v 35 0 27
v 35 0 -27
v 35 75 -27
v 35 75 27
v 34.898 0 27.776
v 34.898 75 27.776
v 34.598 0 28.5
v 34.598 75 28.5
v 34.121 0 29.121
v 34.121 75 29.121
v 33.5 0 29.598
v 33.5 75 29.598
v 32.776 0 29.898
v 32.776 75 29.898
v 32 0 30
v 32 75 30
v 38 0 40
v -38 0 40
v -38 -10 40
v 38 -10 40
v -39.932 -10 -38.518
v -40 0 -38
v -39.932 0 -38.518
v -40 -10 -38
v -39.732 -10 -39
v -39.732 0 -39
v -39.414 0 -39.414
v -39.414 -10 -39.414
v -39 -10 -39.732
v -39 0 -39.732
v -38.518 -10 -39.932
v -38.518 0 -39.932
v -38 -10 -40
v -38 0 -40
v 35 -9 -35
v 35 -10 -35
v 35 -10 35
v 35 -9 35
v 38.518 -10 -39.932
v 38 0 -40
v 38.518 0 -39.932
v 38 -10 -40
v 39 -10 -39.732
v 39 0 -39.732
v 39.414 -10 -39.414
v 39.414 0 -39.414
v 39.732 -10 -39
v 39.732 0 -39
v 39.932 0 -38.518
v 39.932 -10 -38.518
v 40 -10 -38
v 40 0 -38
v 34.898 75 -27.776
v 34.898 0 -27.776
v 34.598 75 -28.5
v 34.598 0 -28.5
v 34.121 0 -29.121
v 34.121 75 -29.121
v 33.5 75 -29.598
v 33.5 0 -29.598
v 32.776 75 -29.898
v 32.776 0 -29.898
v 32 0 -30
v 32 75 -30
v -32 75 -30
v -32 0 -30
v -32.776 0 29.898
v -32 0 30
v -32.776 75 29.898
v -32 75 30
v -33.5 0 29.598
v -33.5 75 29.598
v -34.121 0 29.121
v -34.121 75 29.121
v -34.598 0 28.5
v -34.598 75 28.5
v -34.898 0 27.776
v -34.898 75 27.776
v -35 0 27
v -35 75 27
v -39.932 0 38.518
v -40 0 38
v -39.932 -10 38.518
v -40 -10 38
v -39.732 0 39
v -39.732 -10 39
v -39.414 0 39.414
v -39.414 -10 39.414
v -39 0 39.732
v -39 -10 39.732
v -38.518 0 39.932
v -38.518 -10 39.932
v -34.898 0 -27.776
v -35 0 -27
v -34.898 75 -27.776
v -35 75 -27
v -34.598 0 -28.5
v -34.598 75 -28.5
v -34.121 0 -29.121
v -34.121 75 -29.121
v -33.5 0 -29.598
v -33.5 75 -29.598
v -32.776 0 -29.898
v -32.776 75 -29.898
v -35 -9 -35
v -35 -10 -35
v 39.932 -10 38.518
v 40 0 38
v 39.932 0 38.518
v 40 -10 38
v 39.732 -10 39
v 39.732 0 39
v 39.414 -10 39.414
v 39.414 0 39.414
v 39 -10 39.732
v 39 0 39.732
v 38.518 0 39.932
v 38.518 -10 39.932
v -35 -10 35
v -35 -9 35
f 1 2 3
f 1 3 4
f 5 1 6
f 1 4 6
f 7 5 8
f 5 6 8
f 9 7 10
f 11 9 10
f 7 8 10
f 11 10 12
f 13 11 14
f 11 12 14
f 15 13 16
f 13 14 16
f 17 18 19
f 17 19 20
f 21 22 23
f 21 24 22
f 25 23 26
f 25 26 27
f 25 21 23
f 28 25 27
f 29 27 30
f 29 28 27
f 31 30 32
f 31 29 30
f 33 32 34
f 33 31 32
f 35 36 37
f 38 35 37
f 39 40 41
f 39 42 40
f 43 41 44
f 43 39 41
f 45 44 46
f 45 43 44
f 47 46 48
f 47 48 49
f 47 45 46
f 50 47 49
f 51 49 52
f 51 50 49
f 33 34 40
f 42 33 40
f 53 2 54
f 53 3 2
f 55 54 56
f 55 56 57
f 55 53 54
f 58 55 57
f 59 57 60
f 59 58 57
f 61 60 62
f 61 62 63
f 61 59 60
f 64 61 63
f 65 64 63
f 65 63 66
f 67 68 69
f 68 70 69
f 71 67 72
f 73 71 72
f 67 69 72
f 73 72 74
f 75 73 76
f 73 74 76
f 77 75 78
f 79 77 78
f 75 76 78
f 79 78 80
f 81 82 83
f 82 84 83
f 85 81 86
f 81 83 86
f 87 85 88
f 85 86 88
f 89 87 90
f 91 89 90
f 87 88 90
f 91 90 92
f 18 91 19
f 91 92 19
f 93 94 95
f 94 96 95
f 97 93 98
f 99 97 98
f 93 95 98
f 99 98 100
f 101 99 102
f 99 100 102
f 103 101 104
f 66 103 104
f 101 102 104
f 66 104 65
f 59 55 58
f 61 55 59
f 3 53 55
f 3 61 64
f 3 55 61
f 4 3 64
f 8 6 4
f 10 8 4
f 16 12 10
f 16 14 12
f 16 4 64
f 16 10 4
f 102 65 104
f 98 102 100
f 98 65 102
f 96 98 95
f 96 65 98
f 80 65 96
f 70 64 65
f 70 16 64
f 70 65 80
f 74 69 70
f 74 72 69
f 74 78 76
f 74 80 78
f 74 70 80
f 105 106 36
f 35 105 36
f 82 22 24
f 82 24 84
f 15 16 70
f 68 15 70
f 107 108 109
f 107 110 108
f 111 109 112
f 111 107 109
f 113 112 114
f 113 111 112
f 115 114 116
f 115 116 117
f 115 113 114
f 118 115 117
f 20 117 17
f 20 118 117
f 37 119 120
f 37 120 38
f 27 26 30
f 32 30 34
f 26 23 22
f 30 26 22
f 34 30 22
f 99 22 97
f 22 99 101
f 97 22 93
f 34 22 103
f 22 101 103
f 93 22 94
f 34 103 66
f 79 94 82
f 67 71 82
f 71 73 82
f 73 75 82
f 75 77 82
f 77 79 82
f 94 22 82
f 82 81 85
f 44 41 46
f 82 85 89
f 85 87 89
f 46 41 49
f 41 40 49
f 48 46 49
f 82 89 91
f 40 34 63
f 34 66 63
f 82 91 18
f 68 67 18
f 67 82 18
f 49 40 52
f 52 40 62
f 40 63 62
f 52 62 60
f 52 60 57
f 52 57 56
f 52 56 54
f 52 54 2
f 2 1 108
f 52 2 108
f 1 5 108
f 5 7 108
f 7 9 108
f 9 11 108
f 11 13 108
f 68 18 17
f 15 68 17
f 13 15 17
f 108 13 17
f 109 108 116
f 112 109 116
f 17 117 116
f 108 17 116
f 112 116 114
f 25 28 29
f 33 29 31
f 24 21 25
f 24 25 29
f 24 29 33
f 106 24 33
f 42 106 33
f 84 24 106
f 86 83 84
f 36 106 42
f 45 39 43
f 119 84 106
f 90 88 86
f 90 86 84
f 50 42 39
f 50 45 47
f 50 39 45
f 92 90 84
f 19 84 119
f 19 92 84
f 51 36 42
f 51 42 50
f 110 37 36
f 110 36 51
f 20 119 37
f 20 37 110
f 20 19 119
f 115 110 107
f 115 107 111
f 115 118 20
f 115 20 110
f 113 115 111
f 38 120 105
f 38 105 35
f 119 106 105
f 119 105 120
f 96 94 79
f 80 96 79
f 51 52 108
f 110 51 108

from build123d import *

# Parameters (mm, degrees)
F0_W     = 80
F0_H     = 80
F1_DEPTH = 10
F2_R     = 2
F3_W     = 70
F3_H     = 70
F4_DEPTH = 1
F5_W     = 70
F5_H     = 60
F6_DEPTH = 75
F7_R     = 3


with BuildPart() as f1:
    # F0 (on Front) → F1 (new body)
    with BuildSketch(Plane.XZ):
        Rectangle(F0_W, F0_H)
    extrude(amount=F1_DEPTH)

    # F2
    f2_edges = [f1.edges().sort_by_distance(p)[0] for p in [
        (-40, -5, 40),
        (40, -5, 40),
        (40, -5, -40),
        (-40, -5, -40),
    ]]
    fillet(f2_edges, radius=F2_R)

    # F3 (on face) → F4 (cut)
    with BuildSketch(Plane.XZ.offset(10)):
        Rectangle(F3_W, F3_H)
    extrude(amount=-F4_DEPTH, mode=Mode.SUBTRACT)

    # F5 (on face) → F6 (join)
    with BuildSketch(Plane(origin=(0, 0, 0), x_dir=(-1, 0, 0), z_dir=(0, 1, 0))):
        Rectangle(F5_W, F5_H)
    extrude(amount=F6_DEPTH)

    # F7
    f7_edges = [f1.edges().sort_by_distance(p)[0] for p in [
        (35, 37.5, 30),
        (-35, 37.5, 30),
        (35, 37.5, -30),
        (-35, 37.5, -30),
    ]]
    fillet(f7_edges, radius=F7_R)


solid = f1.part
